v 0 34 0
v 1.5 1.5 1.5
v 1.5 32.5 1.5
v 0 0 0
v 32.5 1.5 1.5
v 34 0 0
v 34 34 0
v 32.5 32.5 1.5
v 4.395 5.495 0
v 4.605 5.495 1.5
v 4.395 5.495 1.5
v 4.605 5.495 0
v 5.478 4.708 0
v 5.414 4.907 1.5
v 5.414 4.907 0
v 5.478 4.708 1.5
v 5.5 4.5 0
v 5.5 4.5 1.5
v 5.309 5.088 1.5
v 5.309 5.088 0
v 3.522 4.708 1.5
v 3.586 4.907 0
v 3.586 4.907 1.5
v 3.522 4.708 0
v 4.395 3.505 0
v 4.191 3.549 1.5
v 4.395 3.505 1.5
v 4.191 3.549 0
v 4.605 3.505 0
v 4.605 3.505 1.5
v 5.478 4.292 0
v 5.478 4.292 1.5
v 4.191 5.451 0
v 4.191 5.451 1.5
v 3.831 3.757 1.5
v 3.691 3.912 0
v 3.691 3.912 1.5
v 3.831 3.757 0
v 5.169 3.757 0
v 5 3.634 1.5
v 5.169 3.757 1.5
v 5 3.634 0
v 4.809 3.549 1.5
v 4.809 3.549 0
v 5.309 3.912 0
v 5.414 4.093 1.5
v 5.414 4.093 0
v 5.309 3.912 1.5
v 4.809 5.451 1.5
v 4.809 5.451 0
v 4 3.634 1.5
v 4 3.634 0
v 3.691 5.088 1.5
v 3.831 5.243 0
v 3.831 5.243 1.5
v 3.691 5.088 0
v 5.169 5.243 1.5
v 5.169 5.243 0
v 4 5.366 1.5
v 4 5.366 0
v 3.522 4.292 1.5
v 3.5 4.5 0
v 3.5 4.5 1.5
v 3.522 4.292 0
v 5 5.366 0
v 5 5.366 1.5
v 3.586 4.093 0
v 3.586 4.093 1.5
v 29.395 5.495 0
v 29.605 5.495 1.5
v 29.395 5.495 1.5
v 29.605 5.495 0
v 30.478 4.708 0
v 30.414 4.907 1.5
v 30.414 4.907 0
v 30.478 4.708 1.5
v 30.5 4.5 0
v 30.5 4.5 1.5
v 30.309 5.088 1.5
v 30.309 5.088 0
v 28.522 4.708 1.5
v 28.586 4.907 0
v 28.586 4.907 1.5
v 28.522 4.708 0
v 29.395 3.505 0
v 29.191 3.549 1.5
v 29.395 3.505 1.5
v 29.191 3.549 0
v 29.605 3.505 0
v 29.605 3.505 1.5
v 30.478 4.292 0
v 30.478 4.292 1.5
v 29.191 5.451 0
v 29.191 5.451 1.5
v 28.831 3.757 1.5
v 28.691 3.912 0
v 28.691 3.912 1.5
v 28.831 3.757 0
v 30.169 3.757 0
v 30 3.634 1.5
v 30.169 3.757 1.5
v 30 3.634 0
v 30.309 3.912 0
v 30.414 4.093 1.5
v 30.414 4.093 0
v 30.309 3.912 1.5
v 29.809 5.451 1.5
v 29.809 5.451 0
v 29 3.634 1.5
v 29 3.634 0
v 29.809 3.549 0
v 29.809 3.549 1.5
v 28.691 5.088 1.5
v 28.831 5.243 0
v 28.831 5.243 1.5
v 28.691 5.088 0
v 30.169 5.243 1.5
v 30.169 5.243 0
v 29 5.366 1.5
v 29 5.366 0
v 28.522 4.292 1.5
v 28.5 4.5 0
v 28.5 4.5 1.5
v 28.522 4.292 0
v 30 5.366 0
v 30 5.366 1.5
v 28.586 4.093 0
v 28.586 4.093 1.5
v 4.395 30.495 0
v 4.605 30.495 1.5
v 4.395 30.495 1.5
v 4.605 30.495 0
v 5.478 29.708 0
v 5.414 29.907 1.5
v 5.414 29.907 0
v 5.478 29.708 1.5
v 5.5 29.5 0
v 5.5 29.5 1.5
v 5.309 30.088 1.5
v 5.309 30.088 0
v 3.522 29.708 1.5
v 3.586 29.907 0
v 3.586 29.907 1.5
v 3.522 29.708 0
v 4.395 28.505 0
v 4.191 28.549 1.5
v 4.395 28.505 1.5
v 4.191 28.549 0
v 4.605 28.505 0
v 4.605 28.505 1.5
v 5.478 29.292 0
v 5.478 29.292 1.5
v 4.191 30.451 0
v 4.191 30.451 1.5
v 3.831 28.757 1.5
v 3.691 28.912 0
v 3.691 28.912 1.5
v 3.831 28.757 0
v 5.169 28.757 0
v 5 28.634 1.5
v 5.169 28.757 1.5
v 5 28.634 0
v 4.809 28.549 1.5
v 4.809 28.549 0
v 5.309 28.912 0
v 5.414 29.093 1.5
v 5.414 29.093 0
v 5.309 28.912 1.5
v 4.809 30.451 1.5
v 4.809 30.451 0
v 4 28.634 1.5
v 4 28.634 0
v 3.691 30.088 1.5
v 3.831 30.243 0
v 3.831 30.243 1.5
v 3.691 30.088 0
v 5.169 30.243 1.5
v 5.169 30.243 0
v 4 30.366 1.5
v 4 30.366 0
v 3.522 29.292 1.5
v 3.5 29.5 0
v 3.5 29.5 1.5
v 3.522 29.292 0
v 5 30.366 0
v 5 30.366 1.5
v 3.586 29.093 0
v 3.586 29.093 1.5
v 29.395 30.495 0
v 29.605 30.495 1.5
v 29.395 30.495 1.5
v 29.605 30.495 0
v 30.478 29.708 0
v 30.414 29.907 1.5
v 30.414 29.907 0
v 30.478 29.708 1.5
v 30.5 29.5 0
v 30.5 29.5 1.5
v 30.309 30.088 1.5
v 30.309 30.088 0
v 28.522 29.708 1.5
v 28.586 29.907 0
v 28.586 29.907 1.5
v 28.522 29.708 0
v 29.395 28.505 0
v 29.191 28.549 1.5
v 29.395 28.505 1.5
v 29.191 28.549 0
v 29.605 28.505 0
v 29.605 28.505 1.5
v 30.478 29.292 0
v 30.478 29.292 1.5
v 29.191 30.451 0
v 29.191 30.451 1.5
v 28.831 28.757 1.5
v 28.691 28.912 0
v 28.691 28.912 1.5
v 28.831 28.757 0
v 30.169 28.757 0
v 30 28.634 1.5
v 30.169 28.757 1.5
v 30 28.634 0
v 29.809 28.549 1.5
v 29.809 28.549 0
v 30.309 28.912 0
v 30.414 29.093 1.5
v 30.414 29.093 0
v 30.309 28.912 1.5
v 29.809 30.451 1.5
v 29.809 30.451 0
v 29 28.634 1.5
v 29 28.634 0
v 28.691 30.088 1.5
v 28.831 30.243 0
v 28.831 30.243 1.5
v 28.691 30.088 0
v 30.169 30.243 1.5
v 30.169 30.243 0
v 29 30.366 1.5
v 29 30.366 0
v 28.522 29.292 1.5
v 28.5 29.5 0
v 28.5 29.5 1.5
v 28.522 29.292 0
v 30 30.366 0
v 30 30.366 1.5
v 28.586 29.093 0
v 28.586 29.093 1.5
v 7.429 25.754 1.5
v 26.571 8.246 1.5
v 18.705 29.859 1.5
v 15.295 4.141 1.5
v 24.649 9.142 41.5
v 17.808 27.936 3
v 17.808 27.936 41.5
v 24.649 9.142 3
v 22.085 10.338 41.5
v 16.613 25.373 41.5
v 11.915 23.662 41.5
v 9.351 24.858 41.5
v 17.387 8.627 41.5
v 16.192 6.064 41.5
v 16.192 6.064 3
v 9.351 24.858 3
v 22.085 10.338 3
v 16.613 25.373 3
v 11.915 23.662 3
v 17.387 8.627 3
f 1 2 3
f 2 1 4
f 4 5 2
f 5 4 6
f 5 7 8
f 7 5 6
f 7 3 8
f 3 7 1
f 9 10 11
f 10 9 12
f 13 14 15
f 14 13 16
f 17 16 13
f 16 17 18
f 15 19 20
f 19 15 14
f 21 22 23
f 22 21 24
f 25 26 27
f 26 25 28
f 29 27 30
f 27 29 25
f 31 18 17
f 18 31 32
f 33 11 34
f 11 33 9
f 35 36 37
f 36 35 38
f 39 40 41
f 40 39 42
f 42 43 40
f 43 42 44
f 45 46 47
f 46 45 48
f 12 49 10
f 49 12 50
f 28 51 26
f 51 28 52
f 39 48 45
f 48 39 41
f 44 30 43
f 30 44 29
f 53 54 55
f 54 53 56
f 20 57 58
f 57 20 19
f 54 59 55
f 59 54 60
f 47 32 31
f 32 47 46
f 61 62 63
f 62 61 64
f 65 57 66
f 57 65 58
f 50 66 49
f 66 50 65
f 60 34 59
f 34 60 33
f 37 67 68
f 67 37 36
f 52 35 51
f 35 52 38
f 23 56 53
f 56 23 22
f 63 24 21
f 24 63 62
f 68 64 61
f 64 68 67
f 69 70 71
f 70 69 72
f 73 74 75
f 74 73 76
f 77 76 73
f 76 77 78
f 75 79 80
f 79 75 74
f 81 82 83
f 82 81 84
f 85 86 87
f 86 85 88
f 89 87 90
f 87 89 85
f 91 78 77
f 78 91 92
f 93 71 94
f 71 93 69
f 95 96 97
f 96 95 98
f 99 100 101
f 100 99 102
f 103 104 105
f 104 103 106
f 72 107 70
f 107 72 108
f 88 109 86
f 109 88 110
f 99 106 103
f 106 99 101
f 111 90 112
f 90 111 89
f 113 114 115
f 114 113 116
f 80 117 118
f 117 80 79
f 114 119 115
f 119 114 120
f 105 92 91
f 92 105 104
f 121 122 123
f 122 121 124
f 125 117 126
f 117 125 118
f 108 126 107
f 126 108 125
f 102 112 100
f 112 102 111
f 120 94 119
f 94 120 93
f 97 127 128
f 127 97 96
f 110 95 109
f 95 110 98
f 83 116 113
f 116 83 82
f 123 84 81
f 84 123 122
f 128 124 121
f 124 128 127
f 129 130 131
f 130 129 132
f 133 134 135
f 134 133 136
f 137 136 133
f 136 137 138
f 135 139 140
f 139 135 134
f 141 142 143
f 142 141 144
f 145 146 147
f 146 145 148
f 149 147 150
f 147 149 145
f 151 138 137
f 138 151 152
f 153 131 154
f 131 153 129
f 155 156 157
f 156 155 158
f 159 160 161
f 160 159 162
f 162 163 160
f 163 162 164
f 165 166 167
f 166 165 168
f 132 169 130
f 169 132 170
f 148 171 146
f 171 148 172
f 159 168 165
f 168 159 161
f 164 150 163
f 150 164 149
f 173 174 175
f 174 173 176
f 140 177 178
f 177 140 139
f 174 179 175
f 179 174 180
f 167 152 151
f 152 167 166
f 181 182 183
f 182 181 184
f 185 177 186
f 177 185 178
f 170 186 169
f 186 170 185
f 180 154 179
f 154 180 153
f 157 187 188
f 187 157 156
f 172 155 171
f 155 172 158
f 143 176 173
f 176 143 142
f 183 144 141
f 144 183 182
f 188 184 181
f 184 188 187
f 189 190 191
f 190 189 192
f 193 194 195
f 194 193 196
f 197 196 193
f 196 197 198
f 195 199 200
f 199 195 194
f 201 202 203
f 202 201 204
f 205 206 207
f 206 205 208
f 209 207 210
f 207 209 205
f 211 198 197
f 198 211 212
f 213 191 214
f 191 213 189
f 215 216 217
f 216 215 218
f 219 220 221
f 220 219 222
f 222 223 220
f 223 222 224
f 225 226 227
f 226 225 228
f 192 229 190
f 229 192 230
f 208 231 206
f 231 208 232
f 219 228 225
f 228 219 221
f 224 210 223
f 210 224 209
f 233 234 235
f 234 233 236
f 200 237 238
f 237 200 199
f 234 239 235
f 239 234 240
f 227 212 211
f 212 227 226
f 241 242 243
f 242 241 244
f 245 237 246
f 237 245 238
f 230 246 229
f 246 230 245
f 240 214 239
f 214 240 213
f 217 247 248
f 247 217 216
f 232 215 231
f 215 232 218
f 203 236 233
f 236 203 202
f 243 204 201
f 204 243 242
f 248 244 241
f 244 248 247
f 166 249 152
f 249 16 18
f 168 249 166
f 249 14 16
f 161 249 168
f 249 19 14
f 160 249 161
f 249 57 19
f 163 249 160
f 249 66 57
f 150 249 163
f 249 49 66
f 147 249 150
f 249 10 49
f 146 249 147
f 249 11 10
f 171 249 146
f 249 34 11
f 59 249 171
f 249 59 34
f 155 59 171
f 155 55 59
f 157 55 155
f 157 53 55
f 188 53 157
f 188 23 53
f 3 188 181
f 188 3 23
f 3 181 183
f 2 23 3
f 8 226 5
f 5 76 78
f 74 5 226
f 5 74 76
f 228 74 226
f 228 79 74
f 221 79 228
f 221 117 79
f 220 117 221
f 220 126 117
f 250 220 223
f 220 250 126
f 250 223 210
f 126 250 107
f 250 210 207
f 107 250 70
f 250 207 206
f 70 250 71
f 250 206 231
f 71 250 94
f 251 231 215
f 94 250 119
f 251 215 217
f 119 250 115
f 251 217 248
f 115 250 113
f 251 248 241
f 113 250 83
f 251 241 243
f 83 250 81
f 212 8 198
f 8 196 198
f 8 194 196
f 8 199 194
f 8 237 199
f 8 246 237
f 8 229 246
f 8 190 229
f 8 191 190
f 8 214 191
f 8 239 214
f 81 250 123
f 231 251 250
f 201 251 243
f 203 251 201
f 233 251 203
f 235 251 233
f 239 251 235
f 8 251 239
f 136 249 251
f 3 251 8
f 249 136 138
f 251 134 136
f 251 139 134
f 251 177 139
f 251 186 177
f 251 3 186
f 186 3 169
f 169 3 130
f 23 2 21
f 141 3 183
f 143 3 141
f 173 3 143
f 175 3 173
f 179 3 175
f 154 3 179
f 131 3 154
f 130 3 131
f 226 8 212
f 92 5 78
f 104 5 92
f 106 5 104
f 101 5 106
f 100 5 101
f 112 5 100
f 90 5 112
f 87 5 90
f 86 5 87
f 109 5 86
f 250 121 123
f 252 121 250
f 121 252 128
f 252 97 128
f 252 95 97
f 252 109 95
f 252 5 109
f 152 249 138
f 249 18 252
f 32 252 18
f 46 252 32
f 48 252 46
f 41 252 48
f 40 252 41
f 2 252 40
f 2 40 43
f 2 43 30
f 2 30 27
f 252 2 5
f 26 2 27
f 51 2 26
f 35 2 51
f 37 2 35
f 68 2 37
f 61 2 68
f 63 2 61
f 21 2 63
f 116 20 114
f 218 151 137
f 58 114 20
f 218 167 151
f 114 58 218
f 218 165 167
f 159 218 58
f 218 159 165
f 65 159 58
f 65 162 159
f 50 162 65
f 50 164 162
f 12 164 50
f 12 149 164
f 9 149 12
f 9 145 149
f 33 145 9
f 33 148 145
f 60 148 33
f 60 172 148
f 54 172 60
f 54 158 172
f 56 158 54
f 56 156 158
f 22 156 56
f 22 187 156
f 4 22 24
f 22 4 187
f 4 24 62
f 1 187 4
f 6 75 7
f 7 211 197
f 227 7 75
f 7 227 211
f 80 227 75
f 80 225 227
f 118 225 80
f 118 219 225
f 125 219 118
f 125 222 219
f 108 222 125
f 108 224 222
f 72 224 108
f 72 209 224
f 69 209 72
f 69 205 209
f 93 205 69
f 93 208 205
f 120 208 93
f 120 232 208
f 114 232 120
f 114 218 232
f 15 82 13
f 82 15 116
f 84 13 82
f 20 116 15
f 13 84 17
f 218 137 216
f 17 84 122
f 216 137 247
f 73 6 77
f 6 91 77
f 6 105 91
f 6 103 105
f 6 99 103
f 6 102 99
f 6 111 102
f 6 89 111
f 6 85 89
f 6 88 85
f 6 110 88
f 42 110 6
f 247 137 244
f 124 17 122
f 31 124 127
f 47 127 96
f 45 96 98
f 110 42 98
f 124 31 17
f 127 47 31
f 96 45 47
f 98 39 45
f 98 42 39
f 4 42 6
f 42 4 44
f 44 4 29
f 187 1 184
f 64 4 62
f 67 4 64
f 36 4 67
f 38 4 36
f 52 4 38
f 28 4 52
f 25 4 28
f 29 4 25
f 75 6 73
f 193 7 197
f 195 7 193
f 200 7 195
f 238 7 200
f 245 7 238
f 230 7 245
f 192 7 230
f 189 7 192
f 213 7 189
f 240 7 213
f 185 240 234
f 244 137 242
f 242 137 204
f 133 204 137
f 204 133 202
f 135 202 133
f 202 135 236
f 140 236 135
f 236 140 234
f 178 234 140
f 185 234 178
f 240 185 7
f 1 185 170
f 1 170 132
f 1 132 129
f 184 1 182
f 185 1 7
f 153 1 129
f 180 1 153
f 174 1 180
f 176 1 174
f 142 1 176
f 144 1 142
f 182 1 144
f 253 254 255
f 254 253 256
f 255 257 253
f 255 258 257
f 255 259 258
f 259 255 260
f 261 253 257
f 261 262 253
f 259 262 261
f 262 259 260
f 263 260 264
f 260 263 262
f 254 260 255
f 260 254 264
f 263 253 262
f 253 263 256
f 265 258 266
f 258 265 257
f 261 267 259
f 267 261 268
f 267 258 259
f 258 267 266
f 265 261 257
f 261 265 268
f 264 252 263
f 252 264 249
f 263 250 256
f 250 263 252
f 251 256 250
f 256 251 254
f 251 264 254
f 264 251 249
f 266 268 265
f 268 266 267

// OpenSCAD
// title      : RoboGen parametric A part
// author     : Alice Concordel

partA(0.04,20); //the first parameter is the length of the joint, the second parameter is the angle beta (only for non-planar robots)

module partA(length, beta)
{
//plate parameters
	lengthSlide = 34;
	widthSlide = 34;
	heightSlide = 1.5;

	radiusHole = 1;

//wire hole parameters
	lengthWire = 3;
	widthWire = 9;
	heightWire = heightSlide;

//shaft part parameters
	lengthShaft = 20;
	widthShaft = 9;

// apply transformations to the parameter
length = length*1000; //convert to mm
	union()
	{
		difference()
		{
			// starting plate
			cube([lengthSlide,widthSlide,heightSlide]);
		
			union()
			{
			// chamfer the edges
				rotate ([0,-45,0]) cube([3,widthSlide,3]);
				rotate([45,0,0]) cube([lengthSlide,3,3]);
				translate([lengthSlide,0,0]) rotate([0,-45,0]) cube([3,widthSlide,3]);
				translate([0,widthSlide,0]) rotate([45,0,0]) cube([lengthSlide,3,3]);

			// holes in the plate
					//round
				translate([4.5,4.5,-0.5]) cylinder(r = radiusHole, h = heightSlide+1, $fn = 30);
				translate([lengthSlide-4.5,4.5,-0.5]) cylinder(r = radiusHole, h = heightSlide+1, $fn = 30);
				translate([4.5,widthSlide-4.5,-0.5]) cylinder(r = radiusHole, h = heightSlide+1, $fn = 30);
				translate([lengthSlide-4.5,widthSlide-4.5,-0.5]) cylinder(r = radiusHole, h = heightSlide+1, $fn = 30);
					
					//rectangular holes (only present if the shaft is not rotated)
				if(beta == 0){
				translate([7-lengthWire/2,widthSlide/2-widthWire/2,-0.5]) cube([lengthWire,widthWire,heightSlide+1]);
				translate([lengthSlide-7-lengthWire/2,widthSlide/2-widthWire/2,-0.5]) cube([lengthWire,widthWire,heightSlide+1]);
				}
			}
		}

	//the shaft
		//========================== beta paramter below: rotates the whole thing if needed
		translate([lengthSlide/2,widthSlide/2,0]) rotate([0,0,beta]) translate([-lengthSlide/2,-widthSlide/2,0]) 
	union()
	{
		//main long part 
		//========================== length parameter below
			difference()
			{
			translate([lengthSlide/2-widthShaft/2,widthSlide/2-lengthShaft/2,0]) cube([widthShaft,lengthShaft,length+heightSlide]);
			translate([lengthSlide/2-(widthShaft-4)/2,widthSlide/2-(lengthShaft-4)/2,heightSlide]) cube([widthShaft-4,lengthShaft-4,length+0.5]);
			}

		//chamfer the edges of the shaft base
			difference()
			{
				translate([lengthSlide/2-(widthShaft+3)/2,widthSlide/2-(lengthShaft+3)/2]) cube([widthShaft+3,lengthShaft+3,3]);
				union()
				{
				translate([lengthSlide/2-widthShaft/2-1.5,0,1.5]) rotate ([0,-45,0]) cube([1.5*sqrt(2),widthSlide,1.5*sqrt(2)]);
				translate([0,widthSlide/2-lengthShaft/2-1.5,1.5]) rotate([45,0,0]) cube([lengthSlide,1.5*sqrt(2),1.5*sqrt(2)]);
				translate([lengthSlide/2+widthShaft/2+1.5,0,1.5]) rotate([0,-45,0]) cube([1.5*sqrt(2),widthSlide,1.5*sqrt(2)]);
				translate([0,widthSlide/2+lengthShaft/2+1.5,1.5]) rotate([45,0,0]) cube([lengthSlide,1.5*sqrt(2),1.5*sqrt(2)]);
				}
			}
		}
	}
}
